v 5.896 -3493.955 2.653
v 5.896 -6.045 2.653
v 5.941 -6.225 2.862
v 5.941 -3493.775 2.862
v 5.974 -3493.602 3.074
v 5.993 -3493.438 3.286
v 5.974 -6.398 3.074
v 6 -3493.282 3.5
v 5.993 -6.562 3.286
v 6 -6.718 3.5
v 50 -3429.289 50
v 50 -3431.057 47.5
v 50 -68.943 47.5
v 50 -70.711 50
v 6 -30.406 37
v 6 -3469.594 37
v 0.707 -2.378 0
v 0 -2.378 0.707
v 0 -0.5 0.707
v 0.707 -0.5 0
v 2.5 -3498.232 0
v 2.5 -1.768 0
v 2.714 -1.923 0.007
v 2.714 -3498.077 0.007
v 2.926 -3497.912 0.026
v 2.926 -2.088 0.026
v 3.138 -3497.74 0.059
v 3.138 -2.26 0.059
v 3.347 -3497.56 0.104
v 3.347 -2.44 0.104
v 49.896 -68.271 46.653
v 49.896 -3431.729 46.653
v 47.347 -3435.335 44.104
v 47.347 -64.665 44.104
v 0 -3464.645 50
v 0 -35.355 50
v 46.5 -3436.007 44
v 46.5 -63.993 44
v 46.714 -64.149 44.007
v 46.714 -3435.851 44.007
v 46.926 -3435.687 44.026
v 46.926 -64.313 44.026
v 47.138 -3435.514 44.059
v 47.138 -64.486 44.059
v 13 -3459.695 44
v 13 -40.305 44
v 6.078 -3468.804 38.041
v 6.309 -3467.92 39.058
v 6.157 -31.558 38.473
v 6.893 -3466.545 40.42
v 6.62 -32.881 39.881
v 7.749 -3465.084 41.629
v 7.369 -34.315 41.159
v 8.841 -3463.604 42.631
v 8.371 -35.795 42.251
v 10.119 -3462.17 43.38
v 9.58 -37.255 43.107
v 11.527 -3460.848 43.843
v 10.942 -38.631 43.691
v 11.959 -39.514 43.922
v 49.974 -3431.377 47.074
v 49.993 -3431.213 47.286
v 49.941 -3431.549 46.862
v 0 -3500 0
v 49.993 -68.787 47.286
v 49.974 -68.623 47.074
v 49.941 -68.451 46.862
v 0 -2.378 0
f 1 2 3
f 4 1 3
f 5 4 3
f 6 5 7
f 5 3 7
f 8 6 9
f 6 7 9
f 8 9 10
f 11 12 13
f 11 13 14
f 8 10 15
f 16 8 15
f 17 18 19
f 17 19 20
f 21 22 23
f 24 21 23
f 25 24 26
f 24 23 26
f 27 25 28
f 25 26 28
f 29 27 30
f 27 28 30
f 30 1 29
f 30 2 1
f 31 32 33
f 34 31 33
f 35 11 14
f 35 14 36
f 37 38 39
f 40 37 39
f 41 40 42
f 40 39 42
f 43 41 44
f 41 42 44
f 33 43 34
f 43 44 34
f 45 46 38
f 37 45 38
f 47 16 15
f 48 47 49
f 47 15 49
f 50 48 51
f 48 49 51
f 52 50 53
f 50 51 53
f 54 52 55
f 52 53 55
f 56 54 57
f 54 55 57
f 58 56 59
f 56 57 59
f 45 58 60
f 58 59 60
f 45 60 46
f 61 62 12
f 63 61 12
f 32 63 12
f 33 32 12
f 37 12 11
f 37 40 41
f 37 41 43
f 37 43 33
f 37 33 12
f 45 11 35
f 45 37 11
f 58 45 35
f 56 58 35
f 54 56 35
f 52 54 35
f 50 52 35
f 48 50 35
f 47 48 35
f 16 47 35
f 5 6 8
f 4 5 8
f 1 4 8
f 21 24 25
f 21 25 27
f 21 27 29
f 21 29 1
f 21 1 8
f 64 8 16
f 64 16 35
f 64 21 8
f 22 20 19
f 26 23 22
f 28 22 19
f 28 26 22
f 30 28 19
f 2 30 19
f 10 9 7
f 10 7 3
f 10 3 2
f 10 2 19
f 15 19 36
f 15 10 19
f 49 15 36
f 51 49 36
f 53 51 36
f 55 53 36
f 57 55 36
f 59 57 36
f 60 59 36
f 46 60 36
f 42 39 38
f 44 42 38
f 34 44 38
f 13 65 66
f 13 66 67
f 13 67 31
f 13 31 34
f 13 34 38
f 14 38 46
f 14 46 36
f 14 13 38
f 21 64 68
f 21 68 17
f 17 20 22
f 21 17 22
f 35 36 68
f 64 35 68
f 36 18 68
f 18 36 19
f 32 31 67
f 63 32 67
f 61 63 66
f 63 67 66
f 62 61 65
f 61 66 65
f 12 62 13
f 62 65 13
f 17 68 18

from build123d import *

# Parameters (mm, degrees)
F1_DEPTH  = 3500
F7_DEPTH  = 45
F9_DEPTH  = 45
F11_DEPTH = 3500.001
F13_W     = 3511.1849075183
F13_H     = 7.3810932226
F14_DEPTH = 0.5


with BuildPart() as f1:
    # F0 (on Front) → F1 (new body)
    with BuildSketch(Plane.XZ):
        with BuildLine():
            Line((0, 50), (0, 0))
            Line((0, 0), (2.5, 0))
            ThreePointArc((2.5, 0), (4.9748737342, 1.0251262658), (6, 3.5))
            Line((6, 3.5), (6, 37))
            ThreePointArc((6, 37), (8.0502525317, 41.9497474683), (13, 44))
            Line((13, 44), (46.5, 44))
            ThreePointArc((46.5, 44), (48.9748737342, 45.0251262658), (50, 47.5))
            Line((50, 47.5), (50, 50))
            Line((50, 50), (0, 50))
        make_face()
    extrude(amount=F1_DEPTH)

    # F6 (on 3pt) → F7 (cut)
    with BuildSketch(Plane(origin=(1.9748737342, 0, -1.9748737342), x_dir=(0, -1, 0), z_dir=(-0.7071067812, 0, 0.7071067812))):
        Polygon((3429.2893218813, 70.7106781187), (3500, 0), (3500, 70.7106781187), align=None)
    extrude(amount=F7_DEPTH, mode=Mode.SUBTRACT)

    # F8 (on 3pt) → F9 (cut)
    with BuildSketch(Plane(origin=(1.9748737342, 0, -1.9748737342), x_dir=(0, -1, 0), z_dir=(-0.7071067812, 0, 0.7071067812))):
        Polygon((0, 70.7106781187), (0, 0), (70.7106781187, 70.7106781187), align=None)
    extrude(amount=F9_DEPTH, mode=Mode.SUBTRACT)

    # F10 (on Front) → F11 (cut, through all)
    with BuildSketch(Plane.XZ):
        Polygon((1.6213203436, -1.6213203436), (1.9748737342, -1.9748737342), (51.9748737342, 48.0251262658), (51.6213203436, 48.3786796564), align=None)
    extrude(amount=F11_DEPTH, mode=Mode.SUBTRACT)

    # F13 (on face) → F14 (cut)
    with BuildSketch(Plane(origin=(0, 0, 0), x_dir=(0.7071067812, 0, -0.7071067812), z_dir=(-0.7071067812, 0, -0.7071067812))):
        with Locations((1746.5947982855, -1.3125382829)):
            Rectangle(F13_W, F13_H)
    extrude(amount=-F14_DEPTH, mode=Mode.SUBTRACT)


solid = f1.part
